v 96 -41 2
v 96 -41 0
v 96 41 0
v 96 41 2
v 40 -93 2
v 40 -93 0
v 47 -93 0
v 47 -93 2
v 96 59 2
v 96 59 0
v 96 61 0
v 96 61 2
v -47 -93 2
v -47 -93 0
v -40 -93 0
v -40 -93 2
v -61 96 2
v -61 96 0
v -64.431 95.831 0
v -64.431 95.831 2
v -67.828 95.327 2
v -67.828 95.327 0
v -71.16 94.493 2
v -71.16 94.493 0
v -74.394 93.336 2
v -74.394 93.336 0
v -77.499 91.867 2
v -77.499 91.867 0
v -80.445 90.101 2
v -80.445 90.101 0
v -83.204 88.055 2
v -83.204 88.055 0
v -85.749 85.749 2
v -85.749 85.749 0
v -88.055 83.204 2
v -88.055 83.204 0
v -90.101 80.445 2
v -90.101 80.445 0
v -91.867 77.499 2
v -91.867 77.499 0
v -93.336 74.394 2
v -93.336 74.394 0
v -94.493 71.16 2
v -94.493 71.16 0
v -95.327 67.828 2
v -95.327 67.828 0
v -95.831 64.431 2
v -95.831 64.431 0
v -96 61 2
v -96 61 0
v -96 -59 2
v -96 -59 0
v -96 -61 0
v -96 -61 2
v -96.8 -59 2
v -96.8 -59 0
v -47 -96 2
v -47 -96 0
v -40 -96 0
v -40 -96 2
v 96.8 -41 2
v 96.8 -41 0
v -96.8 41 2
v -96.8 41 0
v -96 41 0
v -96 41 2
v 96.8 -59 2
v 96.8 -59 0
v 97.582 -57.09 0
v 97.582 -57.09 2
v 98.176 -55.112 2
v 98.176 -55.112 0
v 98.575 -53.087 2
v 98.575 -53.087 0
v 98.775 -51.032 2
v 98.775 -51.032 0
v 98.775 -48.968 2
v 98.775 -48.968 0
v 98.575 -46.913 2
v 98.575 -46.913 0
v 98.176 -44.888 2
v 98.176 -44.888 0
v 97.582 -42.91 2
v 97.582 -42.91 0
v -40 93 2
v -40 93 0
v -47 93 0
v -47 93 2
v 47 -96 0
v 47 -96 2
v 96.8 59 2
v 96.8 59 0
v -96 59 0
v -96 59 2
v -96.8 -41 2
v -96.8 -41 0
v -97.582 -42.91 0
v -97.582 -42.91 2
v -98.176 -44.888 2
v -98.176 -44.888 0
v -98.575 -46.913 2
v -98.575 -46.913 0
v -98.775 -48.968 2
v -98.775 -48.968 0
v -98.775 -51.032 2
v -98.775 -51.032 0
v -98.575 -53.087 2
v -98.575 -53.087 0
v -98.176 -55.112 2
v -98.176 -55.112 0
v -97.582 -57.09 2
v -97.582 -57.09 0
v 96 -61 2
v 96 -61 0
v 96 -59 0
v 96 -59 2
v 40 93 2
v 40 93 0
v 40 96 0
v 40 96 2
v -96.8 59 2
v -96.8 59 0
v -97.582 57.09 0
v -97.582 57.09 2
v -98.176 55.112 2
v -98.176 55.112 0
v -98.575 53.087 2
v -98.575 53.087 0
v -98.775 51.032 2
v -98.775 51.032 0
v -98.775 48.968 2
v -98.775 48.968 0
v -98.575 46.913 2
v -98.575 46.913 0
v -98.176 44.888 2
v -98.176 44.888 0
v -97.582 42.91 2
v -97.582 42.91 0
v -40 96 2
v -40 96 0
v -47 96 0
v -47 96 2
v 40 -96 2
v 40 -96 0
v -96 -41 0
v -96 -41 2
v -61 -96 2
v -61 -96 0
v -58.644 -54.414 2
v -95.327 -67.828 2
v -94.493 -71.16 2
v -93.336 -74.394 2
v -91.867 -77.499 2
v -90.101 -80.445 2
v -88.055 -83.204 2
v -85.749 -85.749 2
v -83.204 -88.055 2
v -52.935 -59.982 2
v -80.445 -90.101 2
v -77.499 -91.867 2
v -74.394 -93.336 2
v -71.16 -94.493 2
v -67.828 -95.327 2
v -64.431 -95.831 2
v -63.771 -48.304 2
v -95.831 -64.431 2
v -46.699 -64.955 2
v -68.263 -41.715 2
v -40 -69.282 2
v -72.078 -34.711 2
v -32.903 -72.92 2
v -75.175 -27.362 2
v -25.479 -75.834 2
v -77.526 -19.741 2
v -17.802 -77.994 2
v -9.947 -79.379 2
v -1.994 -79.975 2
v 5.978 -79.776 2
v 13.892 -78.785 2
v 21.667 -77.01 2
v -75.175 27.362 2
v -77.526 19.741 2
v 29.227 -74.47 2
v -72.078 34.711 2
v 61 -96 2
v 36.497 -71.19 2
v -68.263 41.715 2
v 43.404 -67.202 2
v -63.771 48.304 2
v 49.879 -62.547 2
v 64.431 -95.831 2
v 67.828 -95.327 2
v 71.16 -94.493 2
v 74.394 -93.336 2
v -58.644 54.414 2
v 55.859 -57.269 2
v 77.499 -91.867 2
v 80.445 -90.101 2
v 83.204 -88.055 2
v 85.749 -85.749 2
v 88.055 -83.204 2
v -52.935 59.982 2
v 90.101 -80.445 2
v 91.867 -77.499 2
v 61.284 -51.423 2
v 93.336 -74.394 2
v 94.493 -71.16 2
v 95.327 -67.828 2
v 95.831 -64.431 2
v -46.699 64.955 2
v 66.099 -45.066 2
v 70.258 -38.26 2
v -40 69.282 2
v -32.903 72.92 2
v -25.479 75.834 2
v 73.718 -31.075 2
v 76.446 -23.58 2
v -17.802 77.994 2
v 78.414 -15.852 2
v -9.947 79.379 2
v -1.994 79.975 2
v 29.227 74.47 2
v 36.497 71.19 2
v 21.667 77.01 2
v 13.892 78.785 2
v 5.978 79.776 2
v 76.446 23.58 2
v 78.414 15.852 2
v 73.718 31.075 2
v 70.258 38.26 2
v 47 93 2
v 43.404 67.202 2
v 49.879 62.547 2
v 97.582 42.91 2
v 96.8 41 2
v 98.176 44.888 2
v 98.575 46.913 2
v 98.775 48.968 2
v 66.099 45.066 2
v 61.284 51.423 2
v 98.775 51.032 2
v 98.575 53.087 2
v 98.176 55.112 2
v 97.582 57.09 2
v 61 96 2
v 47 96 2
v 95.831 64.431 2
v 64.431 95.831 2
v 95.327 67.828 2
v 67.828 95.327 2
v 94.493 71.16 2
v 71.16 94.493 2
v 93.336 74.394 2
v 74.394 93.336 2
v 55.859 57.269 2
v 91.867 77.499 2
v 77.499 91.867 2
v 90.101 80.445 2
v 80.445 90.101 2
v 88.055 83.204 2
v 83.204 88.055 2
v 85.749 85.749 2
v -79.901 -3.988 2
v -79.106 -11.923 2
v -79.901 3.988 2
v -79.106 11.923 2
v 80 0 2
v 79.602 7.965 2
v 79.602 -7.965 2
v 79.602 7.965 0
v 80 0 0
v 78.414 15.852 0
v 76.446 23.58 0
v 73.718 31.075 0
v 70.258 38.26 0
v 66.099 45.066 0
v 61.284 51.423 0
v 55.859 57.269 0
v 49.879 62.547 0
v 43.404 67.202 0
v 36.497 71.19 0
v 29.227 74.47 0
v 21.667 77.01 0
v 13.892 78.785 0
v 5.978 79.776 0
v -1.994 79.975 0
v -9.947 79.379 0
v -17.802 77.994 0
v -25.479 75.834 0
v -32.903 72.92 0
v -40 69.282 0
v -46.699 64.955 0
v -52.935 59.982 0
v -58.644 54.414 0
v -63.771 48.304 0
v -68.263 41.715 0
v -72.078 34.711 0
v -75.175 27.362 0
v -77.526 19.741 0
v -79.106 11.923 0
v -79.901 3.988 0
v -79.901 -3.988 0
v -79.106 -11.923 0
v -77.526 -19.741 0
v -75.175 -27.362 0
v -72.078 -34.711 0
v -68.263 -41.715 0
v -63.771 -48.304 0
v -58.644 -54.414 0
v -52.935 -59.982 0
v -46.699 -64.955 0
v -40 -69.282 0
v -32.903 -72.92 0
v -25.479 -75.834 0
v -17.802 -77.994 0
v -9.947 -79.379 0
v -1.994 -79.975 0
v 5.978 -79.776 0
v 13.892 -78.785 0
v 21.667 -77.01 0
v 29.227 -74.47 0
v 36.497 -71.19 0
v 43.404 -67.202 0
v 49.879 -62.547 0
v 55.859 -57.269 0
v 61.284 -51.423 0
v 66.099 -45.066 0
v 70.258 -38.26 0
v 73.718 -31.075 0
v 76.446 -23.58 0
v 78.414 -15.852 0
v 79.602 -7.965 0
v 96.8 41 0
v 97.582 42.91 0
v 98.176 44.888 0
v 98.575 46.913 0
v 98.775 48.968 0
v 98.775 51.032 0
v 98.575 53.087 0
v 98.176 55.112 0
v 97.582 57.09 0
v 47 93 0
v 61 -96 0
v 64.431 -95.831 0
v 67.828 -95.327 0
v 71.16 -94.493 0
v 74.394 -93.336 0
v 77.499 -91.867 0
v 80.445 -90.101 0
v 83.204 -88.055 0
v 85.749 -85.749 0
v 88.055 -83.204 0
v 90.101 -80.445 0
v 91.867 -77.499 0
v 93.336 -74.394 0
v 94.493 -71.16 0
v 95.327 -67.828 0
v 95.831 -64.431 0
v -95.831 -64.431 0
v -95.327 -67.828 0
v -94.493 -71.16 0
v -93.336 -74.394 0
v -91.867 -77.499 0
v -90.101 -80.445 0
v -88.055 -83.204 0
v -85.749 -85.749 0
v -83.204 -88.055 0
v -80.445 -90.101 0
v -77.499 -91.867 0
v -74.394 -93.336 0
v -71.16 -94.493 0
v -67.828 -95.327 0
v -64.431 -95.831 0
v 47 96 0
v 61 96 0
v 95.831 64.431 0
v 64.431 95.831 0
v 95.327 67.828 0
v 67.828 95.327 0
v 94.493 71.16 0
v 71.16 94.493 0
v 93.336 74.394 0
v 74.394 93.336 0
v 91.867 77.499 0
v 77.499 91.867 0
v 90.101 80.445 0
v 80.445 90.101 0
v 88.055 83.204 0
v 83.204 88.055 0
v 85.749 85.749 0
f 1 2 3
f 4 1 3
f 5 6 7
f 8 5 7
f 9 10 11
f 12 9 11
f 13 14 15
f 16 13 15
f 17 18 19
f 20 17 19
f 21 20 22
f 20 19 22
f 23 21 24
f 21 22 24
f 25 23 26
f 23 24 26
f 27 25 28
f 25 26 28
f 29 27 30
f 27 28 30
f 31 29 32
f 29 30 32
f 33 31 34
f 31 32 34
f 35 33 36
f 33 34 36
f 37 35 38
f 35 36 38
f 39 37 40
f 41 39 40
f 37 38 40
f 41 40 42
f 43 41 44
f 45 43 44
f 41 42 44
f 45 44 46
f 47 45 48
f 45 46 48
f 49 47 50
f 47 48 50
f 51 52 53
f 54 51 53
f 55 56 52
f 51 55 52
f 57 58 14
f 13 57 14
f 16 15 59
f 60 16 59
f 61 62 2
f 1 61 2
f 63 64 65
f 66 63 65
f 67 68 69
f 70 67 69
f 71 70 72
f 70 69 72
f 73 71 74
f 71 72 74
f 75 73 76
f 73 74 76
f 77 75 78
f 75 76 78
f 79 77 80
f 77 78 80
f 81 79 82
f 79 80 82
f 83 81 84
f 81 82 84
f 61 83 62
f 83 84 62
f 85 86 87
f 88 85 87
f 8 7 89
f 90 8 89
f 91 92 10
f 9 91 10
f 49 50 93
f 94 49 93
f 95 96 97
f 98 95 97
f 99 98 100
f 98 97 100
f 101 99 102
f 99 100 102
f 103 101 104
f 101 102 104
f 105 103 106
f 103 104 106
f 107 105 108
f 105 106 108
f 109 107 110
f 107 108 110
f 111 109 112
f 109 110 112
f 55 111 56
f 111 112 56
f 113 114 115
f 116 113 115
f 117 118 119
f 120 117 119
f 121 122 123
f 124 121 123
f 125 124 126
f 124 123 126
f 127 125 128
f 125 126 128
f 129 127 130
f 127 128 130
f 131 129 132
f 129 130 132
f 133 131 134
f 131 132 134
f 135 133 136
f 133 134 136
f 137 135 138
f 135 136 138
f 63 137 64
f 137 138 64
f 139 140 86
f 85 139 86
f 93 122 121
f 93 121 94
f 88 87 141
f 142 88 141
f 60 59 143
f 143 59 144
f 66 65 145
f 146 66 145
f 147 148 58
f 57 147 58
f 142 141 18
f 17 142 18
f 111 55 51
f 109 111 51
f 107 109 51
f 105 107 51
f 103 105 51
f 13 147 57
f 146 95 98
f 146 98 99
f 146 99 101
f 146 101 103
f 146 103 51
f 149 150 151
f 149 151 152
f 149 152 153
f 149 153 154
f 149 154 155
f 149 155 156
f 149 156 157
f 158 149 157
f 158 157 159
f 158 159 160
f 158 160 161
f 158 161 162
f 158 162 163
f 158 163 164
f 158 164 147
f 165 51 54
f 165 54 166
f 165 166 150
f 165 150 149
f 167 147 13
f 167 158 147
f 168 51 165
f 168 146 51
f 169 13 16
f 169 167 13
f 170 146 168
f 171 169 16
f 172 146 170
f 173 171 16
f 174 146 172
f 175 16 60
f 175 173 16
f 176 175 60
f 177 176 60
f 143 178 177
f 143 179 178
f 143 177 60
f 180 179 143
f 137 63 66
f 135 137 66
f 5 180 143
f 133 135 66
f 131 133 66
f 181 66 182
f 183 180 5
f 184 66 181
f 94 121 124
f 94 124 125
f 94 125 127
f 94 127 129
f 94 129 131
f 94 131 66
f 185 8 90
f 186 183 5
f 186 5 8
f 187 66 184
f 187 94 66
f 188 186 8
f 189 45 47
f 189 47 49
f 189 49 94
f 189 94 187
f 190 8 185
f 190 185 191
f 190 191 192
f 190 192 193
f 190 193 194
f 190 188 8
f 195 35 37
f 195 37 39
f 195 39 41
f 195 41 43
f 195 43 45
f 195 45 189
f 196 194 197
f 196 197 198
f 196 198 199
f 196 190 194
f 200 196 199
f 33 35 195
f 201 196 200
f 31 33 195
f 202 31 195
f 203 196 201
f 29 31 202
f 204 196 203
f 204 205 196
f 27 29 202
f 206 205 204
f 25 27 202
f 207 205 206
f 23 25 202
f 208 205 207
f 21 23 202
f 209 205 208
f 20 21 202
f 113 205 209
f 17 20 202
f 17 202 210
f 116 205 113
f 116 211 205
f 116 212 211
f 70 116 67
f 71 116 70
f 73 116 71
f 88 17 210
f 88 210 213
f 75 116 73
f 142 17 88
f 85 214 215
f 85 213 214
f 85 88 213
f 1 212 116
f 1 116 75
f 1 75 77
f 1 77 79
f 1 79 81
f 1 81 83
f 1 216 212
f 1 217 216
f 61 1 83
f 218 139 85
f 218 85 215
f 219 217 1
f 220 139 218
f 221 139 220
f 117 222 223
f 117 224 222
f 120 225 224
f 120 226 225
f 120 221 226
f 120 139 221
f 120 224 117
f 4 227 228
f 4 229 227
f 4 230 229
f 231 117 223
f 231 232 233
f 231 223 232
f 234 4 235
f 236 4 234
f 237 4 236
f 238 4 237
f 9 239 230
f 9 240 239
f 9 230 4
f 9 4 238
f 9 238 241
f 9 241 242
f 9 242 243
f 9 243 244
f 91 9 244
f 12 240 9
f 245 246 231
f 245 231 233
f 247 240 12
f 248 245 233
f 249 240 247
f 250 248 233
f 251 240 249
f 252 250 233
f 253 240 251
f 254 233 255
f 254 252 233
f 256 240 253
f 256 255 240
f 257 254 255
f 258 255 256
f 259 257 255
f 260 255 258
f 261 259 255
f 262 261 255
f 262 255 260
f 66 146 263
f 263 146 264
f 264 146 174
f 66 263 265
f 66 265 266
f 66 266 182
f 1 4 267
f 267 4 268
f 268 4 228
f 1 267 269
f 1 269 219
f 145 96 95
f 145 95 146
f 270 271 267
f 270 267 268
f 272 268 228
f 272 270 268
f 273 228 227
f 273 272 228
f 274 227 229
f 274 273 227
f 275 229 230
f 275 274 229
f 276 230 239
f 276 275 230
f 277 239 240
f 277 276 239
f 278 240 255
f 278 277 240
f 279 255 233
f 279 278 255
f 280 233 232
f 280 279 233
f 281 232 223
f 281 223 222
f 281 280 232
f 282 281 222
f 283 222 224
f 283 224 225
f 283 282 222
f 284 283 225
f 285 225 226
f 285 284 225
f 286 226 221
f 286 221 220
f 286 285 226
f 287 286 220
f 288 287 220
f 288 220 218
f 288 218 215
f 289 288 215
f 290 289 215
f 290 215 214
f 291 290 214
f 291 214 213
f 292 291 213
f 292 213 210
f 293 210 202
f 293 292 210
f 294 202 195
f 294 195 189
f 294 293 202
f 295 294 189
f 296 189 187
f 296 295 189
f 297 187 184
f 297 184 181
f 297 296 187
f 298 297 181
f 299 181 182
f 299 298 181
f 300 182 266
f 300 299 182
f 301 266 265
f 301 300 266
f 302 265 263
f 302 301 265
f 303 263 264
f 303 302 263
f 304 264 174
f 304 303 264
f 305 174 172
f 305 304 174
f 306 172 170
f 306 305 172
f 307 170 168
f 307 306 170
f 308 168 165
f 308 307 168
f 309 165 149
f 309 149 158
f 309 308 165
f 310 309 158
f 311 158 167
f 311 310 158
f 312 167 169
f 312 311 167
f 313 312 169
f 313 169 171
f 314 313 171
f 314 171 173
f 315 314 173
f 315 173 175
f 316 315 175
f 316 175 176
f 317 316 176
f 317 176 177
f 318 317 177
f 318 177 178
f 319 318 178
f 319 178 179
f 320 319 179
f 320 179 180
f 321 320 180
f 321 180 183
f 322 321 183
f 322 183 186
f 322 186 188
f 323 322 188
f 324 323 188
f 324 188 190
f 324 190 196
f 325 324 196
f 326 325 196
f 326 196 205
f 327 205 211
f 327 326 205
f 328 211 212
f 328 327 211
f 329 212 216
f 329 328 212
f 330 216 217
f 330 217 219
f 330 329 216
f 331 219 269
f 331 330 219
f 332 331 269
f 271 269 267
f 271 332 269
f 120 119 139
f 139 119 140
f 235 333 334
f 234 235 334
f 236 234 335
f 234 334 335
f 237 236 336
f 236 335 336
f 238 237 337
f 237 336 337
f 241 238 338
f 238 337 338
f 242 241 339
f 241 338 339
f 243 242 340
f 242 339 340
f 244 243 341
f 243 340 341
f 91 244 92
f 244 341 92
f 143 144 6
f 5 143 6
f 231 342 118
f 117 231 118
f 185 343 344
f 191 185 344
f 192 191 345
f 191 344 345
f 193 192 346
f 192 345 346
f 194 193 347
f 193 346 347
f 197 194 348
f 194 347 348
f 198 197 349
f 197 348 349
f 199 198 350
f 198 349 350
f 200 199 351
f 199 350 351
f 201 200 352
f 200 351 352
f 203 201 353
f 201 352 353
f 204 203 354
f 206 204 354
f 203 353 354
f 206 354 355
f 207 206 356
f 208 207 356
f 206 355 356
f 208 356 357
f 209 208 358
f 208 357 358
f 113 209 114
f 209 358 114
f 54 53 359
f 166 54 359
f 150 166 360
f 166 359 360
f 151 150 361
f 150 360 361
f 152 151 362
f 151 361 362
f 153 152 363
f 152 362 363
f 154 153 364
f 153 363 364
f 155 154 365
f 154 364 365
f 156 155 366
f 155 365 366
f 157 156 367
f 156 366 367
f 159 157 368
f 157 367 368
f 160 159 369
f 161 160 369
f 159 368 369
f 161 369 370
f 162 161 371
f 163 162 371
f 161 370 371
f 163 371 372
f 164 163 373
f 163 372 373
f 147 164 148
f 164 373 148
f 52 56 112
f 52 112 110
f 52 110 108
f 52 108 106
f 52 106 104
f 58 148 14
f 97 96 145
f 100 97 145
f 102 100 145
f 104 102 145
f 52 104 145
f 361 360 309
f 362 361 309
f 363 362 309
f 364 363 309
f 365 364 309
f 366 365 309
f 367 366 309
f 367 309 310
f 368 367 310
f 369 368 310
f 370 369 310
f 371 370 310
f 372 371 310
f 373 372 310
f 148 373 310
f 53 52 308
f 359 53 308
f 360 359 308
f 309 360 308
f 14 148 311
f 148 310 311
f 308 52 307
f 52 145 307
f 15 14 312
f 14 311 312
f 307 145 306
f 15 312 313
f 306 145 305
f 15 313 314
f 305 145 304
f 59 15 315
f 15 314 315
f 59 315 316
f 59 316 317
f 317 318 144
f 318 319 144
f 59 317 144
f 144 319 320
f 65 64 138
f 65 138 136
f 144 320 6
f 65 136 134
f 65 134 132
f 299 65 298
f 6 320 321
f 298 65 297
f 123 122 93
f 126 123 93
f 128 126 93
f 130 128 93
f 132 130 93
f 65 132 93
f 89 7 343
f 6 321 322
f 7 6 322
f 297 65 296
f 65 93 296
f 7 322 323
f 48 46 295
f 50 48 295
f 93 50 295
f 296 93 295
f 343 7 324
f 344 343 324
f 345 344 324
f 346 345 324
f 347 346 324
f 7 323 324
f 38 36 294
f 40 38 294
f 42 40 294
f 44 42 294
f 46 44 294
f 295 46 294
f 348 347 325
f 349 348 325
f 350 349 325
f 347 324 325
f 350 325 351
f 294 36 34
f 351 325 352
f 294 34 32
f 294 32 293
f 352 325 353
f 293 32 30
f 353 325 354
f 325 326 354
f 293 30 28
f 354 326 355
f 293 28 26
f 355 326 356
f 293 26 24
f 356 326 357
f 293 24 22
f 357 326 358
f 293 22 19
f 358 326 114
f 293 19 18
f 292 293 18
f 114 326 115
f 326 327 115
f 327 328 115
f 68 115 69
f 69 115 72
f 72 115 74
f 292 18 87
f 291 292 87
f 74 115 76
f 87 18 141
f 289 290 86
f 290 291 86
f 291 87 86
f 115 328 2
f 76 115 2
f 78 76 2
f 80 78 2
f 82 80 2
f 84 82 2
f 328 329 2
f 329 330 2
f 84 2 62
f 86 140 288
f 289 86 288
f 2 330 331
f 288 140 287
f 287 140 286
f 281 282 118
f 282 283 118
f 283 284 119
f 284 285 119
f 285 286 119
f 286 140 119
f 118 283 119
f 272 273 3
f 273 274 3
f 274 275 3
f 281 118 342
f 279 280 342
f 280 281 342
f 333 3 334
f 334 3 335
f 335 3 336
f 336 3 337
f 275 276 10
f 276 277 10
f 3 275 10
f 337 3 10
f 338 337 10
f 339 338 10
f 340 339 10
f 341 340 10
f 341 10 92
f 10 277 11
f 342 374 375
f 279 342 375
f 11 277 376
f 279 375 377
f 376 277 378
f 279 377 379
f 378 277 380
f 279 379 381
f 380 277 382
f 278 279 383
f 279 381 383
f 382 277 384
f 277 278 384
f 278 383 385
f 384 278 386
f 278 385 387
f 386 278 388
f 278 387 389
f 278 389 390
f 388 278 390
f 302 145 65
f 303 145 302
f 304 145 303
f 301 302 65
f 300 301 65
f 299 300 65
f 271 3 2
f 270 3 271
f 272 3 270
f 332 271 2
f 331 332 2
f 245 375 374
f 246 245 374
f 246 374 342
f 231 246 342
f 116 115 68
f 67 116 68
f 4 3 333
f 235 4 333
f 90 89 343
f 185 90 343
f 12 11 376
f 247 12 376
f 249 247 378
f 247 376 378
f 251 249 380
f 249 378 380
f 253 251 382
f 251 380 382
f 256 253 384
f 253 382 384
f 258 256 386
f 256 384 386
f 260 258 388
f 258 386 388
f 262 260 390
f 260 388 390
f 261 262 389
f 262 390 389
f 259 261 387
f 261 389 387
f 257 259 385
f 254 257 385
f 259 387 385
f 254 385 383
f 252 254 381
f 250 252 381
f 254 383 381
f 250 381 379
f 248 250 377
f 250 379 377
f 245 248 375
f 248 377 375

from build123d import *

# Parameters (mm, degrees)
F0_W     = 0.8
F0_H     = 18
F0_R     = 80
F1_DEPTH = 2


with BuildPart() as f1:
    # F0 (on Top) → F1 (new body)
    with BuildSketch(Plane.XY):
        with BuildLine():
            Line((-96.8, 41), (-96.8, 59))
            ThreePointArc((-96.8, 59), (-98.8, 50), (-96.8, 41))
        make_face()
        with Locations((-96.4, -50)):
            Rectangle(F0_W, F0_H)
        with BuildLine():
            Line((96.8, 59), (96, 59))
            Line((96, 59), (96, 41))
            Line((96, 41), (96.8, 41))
            ThreePointArc((96.8, 41), (98.8, 50), (96.8, 59))
        make_face()
        with BuildLine():
            Line((-96.8, -59), (-96.8, -41))
            ThreePointArc((-96.8, -41), (-98.8, -50), (-96.8, -59))
        make_face()
        with BuildLine():
            ThreePointArc((96, 61), (85.748737, 85.748737), (61, 96))
            Line((61, 96), (47, 96))
            Line((47, 96), (47, 93))
            Line((47, 93), (40, 93))
            Line((40, 93), (40, 96))
            Line((40, 96), (-40, 96))
            Line((-40, 96), (-40, 93))
            Line((-40, 93), (-47, 93))
            Line((-47, 93), (-47, 96))
            Line((-47, 96), (-61, 96))
            ThreePointArc((-61, 96), (-85.748737, 85.748737), (-96, 61))
            Line((-96, 61), (-96, 59))
            Line((-96, 59), (-96, 41))
            Line((-96, 41), (-96, -41))
            Line((-96, -41), (-96, -59))
            Line((-96, -59), (-96, -61))
            ThreePointArc((-96, -61), (-85.748737, -85.748737), (-61, -96))
            Line((-61, -96), (-47, -96))
            Line((-47, -96), (-47, -93))
            Line((-47, -93), (-40, -93))
            Line((-40, -93), (-40, -96))
            Line((-40, -96), (40, -96))
            Line((40, -96), (40, -93))
            Line((40, -93), (47, -93))
            Line((47, -93), (47, -96))
            Line((47, -96), (61, -96))
            ThreePointArc((61, -96), (85.748737, -85.748737), (96, -61))
            Line((96, -61), (96, -59))
            Line((96, -59), (96, -41))
            Line((96, -41), (96, 41))
            Line((96, 41), (96, 59))
            Line((96, 59), (96, 61))
        make_face()
        Circle(F0_R, mode=Mode.SUBTRACT)
        with Locations((-96.4, 50)):
            Rectangle(F0_W, F0_H)
        with BuildLine():
            Line((96.8, -41), (96, -41))
            Line((96, -41), (96, -59))
            Line((96, -59), (96.8, -59))
            ThreePointArc((96.8, -59), (98.8, -50), (96.8, -41))
        make_face()
    extrude(amount=F1_DEPTH)


solid = f1.part
